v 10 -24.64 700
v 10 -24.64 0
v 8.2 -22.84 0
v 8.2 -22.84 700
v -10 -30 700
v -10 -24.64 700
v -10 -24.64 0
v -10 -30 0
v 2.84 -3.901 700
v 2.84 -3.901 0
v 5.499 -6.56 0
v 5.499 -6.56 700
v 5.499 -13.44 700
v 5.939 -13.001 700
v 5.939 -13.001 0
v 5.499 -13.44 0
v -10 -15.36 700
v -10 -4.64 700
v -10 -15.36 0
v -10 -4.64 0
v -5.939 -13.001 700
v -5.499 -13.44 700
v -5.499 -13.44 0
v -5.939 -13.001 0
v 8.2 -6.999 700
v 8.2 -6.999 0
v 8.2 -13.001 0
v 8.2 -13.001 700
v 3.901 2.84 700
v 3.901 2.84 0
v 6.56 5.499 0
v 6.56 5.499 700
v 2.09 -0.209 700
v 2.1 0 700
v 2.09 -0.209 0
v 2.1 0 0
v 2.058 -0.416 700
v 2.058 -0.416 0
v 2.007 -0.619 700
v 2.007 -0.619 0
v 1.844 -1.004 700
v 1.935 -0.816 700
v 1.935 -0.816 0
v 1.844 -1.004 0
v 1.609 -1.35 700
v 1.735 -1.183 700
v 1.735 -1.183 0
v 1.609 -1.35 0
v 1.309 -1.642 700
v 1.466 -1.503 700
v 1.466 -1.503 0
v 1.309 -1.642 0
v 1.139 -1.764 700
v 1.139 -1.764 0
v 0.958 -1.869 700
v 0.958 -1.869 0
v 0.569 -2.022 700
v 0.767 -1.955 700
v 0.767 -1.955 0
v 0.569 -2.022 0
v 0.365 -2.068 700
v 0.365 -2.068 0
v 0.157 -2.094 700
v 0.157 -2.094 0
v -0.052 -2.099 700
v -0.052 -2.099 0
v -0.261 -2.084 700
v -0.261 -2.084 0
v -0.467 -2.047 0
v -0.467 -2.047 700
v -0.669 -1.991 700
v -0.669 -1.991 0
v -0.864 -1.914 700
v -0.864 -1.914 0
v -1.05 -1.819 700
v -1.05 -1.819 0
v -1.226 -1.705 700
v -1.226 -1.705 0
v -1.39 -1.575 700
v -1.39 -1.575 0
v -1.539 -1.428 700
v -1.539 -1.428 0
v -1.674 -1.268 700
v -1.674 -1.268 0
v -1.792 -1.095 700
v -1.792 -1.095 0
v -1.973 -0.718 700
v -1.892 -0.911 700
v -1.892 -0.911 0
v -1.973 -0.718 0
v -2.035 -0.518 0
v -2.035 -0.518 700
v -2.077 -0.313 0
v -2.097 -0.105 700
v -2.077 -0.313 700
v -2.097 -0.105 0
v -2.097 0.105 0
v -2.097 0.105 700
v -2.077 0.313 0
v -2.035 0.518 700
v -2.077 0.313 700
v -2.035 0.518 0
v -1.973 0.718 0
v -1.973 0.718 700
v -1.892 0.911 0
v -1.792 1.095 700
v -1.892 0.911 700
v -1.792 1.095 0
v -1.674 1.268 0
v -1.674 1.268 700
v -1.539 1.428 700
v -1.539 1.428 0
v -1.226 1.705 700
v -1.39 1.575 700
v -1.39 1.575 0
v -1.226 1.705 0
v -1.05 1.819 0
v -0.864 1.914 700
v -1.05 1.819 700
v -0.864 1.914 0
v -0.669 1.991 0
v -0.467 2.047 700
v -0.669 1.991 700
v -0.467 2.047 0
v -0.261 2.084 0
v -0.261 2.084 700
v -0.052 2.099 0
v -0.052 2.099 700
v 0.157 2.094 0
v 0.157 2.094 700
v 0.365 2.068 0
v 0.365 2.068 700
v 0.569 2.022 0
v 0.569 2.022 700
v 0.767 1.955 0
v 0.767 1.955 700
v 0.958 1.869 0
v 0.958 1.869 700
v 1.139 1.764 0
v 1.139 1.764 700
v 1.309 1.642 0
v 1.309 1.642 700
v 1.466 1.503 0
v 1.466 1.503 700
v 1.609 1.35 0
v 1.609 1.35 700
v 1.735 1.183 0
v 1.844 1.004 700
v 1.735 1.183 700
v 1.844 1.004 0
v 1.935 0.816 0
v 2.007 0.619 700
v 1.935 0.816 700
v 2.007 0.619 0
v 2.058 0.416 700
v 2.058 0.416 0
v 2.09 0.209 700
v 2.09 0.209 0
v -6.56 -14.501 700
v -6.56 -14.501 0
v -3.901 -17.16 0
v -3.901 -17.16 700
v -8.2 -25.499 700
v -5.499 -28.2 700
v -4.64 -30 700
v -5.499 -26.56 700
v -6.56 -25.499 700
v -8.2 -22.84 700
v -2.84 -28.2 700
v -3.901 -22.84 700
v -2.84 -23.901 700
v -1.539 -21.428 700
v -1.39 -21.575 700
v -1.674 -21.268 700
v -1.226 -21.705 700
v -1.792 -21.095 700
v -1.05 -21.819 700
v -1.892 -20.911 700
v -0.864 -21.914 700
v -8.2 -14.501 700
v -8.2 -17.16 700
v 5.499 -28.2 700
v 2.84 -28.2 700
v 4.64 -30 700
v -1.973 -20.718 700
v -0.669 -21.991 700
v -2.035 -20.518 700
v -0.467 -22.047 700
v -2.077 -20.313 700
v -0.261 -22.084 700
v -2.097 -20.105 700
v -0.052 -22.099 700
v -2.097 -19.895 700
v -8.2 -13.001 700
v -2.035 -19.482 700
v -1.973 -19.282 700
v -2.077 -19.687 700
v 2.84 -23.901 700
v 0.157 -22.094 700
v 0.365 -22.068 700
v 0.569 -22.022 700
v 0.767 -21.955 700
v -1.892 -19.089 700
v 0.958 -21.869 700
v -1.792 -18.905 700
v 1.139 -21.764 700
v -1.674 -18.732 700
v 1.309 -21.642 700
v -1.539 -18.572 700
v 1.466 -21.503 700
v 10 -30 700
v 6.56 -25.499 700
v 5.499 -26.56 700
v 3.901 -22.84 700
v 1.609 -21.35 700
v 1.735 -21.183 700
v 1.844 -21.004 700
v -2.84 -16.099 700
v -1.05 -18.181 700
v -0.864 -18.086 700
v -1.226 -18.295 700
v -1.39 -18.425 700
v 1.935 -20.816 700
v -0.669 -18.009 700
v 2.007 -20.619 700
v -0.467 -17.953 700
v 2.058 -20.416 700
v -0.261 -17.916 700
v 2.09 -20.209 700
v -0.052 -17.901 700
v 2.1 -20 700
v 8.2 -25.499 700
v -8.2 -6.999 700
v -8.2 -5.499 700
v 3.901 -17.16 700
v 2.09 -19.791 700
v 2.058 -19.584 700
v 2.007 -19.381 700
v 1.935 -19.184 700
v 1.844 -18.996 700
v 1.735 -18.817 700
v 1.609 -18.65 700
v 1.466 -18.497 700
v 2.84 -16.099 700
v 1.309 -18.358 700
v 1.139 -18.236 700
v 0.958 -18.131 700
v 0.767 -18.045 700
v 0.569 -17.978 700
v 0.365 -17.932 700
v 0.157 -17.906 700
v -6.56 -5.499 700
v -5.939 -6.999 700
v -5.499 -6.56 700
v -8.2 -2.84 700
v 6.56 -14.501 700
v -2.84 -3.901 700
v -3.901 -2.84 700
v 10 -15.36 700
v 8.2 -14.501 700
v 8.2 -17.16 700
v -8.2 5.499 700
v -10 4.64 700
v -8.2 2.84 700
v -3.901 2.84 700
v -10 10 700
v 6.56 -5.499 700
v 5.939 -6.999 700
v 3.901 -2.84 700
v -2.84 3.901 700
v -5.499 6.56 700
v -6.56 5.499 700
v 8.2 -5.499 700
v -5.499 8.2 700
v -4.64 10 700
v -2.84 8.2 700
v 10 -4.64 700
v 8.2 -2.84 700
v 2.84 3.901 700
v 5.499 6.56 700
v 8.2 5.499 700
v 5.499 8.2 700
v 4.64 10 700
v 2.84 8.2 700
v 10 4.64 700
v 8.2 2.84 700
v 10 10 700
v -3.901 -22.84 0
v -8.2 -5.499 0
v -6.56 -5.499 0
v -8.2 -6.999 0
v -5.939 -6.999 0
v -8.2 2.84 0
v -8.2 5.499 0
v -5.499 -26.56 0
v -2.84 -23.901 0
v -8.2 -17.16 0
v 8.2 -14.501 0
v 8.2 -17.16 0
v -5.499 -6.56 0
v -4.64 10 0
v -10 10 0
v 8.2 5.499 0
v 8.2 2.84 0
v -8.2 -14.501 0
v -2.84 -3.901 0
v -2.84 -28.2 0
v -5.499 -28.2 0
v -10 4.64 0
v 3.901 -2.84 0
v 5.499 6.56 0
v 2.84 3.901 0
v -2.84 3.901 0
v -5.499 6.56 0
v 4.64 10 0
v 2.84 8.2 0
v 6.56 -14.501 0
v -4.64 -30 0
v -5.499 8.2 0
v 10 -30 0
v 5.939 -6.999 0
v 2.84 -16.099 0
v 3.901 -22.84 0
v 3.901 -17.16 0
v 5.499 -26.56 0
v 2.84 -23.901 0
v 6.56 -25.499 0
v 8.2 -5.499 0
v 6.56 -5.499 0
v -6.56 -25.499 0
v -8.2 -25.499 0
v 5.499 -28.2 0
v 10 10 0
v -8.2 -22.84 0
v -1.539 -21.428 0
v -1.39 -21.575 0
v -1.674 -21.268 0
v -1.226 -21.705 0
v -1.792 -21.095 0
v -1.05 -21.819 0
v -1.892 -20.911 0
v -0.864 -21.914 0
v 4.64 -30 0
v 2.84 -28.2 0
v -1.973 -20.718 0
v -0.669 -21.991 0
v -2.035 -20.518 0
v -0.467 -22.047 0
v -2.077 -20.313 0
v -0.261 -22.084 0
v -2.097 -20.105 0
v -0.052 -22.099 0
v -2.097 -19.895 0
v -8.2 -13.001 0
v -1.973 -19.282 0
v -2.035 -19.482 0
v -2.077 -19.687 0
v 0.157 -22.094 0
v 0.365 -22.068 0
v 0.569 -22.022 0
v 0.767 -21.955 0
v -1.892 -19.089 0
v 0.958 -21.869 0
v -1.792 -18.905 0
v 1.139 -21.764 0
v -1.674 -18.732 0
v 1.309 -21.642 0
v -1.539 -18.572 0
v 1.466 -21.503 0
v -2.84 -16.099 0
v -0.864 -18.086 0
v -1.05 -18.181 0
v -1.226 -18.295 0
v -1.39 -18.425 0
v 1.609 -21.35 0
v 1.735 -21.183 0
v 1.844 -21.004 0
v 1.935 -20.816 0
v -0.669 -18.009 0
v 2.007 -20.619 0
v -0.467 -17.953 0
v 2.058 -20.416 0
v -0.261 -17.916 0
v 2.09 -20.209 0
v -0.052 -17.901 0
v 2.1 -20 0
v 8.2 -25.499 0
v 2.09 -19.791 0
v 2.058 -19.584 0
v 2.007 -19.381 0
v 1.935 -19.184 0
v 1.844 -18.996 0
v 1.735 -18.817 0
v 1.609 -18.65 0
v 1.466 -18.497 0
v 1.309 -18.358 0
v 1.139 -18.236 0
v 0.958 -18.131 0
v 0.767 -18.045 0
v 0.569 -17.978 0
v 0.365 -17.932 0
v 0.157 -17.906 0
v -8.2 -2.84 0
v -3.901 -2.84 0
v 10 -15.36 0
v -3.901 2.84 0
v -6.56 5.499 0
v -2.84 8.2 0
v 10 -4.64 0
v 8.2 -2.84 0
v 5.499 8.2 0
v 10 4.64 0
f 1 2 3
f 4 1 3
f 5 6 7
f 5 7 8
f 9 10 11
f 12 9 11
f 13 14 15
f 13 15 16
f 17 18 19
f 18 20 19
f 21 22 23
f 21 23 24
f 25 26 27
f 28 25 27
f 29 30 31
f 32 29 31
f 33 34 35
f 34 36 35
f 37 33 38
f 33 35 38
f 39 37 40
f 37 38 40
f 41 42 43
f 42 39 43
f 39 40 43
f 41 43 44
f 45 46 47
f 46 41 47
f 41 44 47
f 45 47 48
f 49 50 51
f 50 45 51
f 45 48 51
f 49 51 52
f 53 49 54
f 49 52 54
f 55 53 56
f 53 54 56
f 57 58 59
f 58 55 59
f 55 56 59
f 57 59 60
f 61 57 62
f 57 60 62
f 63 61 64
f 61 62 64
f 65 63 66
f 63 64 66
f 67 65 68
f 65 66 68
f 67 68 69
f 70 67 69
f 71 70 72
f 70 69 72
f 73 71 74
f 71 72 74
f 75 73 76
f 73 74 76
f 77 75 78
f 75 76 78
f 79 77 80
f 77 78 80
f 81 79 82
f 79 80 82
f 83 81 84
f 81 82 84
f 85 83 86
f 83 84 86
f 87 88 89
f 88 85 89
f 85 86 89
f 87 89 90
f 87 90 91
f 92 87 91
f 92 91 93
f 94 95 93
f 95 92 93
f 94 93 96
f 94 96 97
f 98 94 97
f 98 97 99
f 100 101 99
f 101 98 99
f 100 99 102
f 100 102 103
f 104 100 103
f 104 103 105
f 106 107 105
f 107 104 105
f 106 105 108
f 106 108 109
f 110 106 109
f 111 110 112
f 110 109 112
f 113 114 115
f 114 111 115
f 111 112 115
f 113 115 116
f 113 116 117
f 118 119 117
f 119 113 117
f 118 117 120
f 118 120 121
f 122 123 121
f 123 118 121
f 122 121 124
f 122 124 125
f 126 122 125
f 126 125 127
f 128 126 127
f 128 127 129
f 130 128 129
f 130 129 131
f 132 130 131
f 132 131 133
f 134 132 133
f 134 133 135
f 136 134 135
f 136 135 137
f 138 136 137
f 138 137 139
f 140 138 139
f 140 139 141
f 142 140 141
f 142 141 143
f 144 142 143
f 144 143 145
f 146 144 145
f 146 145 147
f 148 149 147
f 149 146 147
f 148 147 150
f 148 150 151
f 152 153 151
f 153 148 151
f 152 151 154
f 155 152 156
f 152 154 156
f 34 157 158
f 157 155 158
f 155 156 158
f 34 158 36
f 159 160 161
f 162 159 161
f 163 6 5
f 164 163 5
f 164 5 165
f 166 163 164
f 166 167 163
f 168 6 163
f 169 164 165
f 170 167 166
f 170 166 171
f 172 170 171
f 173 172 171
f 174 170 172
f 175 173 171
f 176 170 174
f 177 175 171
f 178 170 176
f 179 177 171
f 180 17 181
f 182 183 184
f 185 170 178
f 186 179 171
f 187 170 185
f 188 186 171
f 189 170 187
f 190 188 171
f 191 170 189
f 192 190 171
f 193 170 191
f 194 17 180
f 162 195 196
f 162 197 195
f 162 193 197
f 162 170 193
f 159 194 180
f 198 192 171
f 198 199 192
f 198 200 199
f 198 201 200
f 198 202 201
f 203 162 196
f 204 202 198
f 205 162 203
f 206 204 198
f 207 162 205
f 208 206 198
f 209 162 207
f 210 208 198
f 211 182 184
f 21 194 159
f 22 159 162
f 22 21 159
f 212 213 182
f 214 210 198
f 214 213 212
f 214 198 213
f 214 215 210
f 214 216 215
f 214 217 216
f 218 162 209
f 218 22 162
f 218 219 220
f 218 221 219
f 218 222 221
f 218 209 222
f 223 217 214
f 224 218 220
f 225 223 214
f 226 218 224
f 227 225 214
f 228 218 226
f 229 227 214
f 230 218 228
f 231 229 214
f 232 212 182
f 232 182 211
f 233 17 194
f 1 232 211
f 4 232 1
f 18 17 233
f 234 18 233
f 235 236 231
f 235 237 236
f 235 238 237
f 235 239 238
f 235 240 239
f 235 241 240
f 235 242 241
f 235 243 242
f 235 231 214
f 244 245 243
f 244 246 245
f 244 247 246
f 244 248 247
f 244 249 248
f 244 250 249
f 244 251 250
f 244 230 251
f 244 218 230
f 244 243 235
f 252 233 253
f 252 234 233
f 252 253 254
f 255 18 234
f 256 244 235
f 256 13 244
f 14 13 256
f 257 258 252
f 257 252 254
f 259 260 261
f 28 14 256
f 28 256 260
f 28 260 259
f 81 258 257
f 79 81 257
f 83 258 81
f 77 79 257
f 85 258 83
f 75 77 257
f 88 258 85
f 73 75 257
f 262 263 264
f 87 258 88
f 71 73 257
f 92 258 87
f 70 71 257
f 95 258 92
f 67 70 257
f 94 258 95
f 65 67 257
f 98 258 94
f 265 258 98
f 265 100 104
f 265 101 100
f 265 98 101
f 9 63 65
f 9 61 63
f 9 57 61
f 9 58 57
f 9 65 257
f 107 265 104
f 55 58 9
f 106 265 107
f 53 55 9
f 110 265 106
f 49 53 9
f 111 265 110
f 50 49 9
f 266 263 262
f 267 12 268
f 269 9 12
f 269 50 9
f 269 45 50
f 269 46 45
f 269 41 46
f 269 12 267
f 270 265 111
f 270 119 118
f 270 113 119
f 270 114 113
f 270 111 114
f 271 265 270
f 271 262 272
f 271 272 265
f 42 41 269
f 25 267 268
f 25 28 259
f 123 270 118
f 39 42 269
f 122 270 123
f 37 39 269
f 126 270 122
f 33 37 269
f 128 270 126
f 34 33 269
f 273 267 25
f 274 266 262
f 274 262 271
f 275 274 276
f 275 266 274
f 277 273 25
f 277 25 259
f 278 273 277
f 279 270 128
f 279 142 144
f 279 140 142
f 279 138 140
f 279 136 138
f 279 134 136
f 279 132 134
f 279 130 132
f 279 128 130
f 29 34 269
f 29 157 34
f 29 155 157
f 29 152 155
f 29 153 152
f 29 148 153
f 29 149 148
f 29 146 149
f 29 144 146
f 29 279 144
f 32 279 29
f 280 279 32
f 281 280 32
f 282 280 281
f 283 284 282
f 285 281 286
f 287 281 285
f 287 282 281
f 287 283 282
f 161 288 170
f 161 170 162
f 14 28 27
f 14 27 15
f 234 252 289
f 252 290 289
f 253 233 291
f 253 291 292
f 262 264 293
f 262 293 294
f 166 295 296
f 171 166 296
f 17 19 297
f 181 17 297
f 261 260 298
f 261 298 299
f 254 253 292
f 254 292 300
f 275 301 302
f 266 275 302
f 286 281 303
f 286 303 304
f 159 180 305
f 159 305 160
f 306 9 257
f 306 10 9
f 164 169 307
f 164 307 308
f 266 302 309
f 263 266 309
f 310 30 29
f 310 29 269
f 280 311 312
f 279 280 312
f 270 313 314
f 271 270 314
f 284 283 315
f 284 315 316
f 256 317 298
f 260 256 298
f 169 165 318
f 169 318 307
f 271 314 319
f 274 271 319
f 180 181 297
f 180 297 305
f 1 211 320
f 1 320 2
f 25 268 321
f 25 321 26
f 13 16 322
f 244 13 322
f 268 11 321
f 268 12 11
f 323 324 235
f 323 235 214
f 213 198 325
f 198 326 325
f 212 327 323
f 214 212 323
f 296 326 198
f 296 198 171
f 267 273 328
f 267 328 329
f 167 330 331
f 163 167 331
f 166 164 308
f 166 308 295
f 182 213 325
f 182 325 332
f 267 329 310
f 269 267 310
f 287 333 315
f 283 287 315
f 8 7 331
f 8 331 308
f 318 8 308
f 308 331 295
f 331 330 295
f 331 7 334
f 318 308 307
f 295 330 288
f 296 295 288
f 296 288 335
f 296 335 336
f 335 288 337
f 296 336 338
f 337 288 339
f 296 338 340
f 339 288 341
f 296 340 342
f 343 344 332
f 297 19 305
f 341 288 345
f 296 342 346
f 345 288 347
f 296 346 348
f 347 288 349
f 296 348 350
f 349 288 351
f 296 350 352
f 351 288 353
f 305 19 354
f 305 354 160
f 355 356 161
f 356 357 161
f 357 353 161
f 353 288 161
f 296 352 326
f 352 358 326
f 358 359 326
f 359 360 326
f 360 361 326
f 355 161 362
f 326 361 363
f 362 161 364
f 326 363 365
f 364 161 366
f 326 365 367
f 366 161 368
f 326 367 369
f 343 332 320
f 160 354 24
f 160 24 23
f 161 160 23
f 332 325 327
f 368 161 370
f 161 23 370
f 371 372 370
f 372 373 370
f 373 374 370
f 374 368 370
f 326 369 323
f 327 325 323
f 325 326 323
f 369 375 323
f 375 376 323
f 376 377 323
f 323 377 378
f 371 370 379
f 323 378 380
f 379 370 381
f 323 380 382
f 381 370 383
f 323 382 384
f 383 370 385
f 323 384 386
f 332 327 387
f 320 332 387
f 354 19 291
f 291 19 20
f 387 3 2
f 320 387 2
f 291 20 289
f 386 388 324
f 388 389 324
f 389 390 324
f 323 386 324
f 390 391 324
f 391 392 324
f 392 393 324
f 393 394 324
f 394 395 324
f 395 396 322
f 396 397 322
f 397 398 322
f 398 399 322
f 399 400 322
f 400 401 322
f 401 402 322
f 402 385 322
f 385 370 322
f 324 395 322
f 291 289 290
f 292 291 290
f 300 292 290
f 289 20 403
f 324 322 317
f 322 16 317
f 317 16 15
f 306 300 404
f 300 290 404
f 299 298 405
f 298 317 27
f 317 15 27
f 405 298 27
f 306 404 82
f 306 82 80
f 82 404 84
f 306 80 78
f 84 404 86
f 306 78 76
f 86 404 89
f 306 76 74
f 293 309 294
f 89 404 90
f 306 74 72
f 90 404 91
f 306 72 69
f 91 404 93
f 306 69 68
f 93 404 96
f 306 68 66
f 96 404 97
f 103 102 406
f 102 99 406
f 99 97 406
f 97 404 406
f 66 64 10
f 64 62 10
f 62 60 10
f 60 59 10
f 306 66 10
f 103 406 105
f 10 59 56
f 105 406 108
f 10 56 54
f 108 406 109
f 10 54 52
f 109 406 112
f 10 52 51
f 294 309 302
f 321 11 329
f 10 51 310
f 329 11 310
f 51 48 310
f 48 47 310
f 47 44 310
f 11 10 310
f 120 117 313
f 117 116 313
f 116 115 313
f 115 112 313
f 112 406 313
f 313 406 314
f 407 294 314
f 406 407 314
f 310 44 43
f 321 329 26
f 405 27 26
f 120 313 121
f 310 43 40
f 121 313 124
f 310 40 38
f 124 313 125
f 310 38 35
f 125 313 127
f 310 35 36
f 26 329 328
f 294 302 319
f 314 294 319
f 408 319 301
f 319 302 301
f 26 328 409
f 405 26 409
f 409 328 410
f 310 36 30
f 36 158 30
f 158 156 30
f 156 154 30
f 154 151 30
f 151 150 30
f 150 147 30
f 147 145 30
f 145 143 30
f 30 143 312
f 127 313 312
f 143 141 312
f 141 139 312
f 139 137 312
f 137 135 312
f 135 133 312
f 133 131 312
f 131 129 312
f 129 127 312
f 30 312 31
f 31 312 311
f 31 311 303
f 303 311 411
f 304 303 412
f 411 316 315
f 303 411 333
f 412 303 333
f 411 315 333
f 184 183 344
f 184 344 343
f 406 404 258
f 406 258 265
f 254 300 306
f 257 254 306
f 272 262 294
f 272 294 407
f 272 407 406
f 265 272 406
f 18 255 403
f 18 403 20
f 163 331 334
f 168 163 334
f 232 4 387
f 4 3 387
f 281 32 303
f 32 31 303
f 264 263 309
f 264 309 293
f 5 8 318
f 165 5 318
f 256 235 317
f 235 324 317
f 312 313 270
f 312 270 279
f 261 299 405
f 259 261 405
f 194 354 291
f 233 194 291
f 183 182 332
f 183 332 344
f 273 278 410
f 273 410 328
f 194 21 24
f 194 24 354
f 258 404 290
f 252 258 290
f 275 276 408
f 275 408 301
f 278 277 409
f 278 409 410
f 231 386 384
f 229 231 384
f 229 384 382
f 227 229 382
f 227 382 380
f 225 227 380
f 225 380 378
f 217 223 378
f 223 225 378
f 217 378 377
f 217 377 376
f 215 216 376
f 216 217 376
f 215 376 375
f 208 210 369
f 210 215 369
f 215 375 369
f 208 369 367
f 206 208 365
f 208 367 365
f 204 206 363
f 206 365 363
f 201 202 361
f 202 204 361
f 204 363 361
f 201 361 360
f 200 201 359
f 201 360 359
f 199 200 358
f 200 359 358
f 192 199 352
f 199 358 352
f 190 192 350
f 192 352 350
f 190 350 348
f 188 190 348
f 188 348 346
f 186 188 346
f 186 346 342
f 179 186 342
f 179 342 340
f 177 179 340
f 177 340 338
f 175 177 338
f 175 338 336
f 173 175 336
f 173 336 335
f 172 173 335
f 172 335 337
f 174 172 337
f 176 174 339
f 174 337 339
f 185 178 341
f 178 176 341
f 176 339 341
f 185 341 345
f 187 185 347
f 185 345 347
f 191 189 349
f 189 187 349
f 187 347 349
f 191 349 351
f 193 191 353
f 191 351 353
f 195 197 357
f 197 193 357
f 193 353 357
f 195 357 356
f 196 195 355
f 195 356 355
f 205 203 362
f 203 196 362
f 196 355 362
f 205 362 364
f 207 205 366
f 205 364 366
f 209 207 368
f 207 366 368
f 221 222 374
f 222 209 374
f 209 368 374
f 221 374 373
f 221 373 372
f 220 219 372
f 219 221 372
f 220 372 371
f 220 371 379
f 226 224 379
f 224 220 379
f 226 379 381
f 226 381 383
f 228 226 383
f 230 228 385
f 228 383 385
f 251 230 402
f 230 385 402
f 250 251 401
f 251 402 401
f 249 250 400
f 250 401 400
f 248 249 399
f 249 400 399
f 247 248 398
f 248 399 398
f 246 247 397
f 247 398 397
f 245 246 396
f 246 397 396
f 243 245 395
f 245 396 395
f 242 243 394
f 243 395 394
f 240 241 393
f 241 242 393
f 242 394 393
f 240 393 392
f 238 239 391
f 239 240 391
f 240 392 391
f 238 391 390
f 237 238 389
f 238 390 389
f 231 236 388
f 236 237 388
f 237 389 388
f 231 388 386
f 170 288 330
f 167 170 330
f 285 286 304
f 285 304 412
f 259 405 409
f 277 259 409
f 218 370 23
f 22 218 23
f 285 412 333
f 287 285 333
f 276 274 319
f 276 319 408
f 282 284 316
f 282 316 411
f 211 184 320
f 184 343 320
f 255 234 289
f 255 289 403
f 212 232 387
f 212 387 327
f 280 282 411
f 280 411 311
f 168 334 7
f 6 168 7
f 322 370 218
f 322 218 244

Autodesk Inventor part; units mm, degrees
ref_plane "YZ Plane" through (0, 0, 0) normal (1, 0, 0) x (0, 1, 0)
sketch "Sketch1" plane through (0, 0, 0) normal (0, 0, 1) x (1, 0, 0)
  line L0 (-3.9007, 3.9007) -> (3.9007, 3.9007)
  line L1 (3.9007, 3.9007) -> (3.9007, -3.9007)
  line L2 (3.9007, -3.9007) -> (-3.9007, -3.9007)
  line L3 (-3.9007, -3.9007) -> (-3.9007, 3.9007)
  line L4 (0, 3.9007) -> (0, -3.9007) construction
  line L5 (-3.9007, 0) -> (3.9007, 0) construction
  circle A0 centre (0, 0) radius 2.1
  line L6 (0, 0) -> (-16.1173, 16.1173) construction
  line L7 (0, 0) -> (22.7933, 0) construction
  line L8 (-2.84, 3.9007) -> (-5.4993, 6.56)
  line L9 (-5.4993, 6.56) -> (-5.4993, 8.2)
  line L10 (-5.4993, 8.2) -> (-2.84, 8.2)
  line L11 (-2.84, 8.2) -> (-4.64, 10)
  line L12 (-4.64, 10) -> (-10, 10)
  line L13 (-10, 10) -> (-10, 4.64)
  line L14 (-10, 4.64) -> (-8.2, 2.84)
  line L15 (-8.2, 2.84) -> (-8.2, 5.4993)
  line L16 (-8.2, 5.4993) -> (-6.56, 5.4993)
  line L17 (-6.56, 5.4993) -> (-3.9007, 2.84)
  line L18 (-3.9007, 2.84) -> (-11.3102, 2.84) construction
  line L19 (-2.84, 3.9007) -> (-3.9007, 3.9007)
  line L20 (-3.9007, 2.84) -> (-3.9007, 3.9007)
  line L21 (-3.9007, -2.84) -> (-6.56, -5.4993)
  line L22 (-6.56, -5.4993) -> (-8.2, -5.4993)
  line L23 (-8.2, -5.4993) -> (-8.2, -2.84)
  line L24 (-8.2, -2.84) -> (-10, -4.64)
  line L25 (-10, -4.64) -> (-10, -10)
  line L26 (-10, -10) -> (-4.64, -10)
  line L27 (-4.64, -10) -> (-2.84, -8.2)
  line L28 (-2.84, -8.2) -> (-5.4993, -8.2)
  line L29 (-5.4993, -8.2) -> (-5.4993, -6.56)
  line L30 (-5.4993, -6.56) -> (-2.84, -3.9007)
  line L31 (-3.9007, -2.84) -> (-3.9007, -3.9007)
  line L32 (-2.84, -3.9007) -> (-3.9007, -3.9007)
  line L33 (2.84, -3.9007) -> (5.4993, -6.56)
  line L34 (5.4993, -6.56) -> (5.4993, -8.2)
  line L35 (5.4993, -8.2) -> (2.84, -8.2)
  line L36 (2.84, -8.2) -> (4.64, -10)
  line L37 (4.64, -10) -> (10, -10)
  line L38 (10, -10) -> (10, -4.64)
  line L39 (10, -4.64) -> (8.2, -2.84)
  line L40 (8.2, -2.84) -> (8.2, -5.4993)
  line L41 (8.2, -5.4993) -> (6.56, -5.4993)
  line L42 (6.56, -5.4993) -> (3.9007, -2.84)
  line L43 (2.84, -3.9007) -> (3.9007, -3.9007)
  line L44 (3.9007, -2.84) -> (3.9007, -3.9007)
  line L45 (3.9007, 2.84) -> (6.56, 5.4993)
  line L46 (6.56, 5.4993) -> (8.2, 5.4993)
  line L47 (8.2, 5.4993) -> (8.2, 2.84)
  line L48 (8.2, 2.84) -> (10, 4.64)
  line L49 (10, 4.64) -> (10, 10)
  line L50 (10, 10) -> (4.64, 10)
  line L51 (4.64, 10) -> (2.84, 8.2)
  line L52 (2.84, 8.2) -> (5.4993, 8.2)
  line L53 (5.4993, 8.2) -> (5.4993, 6.56)
  line L54 (5.4993, 6.56) -> (2.84, 3.9007)
  line L55 (3.9007, 2.84) -> (3.9007, 3.9007)
  line L56 (2.84, 3.9007) -> (3.9007, 3.9007)
  dimension "d7" = 4.2
  dimension "d8" = 135
  dimension "d9" = 1.5
  dimension "d10" = 1.64
  dimension "d11" = 1.8
  dimension "d12" = 2.84
  dimension "d13" = 10
  dimension "d16" = 360
extrude "Extrusion1" add sketch "Sketch1" along normal blind 700
pattern_linear "Rectangular Pattern1" count 2 spacing 20 along (0, -1, 0) of "Extrusion1"
sketch "Sketch2" plane through (0, 0, 700) normal (0, 0, 1) x (1, 0, 0)
  line L0 (8.2, -2.84) -> (8.2, -5.4993) projected
  line L1 (8.2, -5.4993) -> (6.56, -5.4993) projected
  line L2 (-6.56, -5.4993) -> (-8.2, -5.4993) projected
  line L3 (-8.2, -5.4993) -> (-8.2, -2.84) projected
  line L4 (-8.2, -14.5007) -> (-6.56, -14.5007) projected
  line L5 (6.56, -14.5007) -> (8.2, -14.5007) projected
  line L6 (5.4993, -11.8) -> (5.4993, -13.44) projected
  line L7 (5.4993, -13.44) -> (2.84, -16.0993) projected
  line L8 (-2.84, -16.0993) -> (-5.4993, -13.44) projected
  line L9 (-5.4993, -8.2) -> (-5.4993, -6.56) projected
  line L10 (-5.4993, -6.56) -> (-2.84, -3.9007) projected
  line L11 (2.84, -3.9007) -> (5.4993, -6.56) projected
  line L12 (2.84, -8.2) -> (4.64, -10) projected
  line L13 (-8.2, -6.9993) -> (-5.9387, -6.9993)
  line L14 (-5.9387, -6.9993) -> (-4.1231, -5.1837)
  line L15 (-4.1231, -5.1837) -> (4.1231, -5.1837)
  line L16 (4.1231, -5.1837) -> (5.9387, -6.9993)
  line L17 (5.9387, -6.9993) -> (8.2, -6.9993)
  line L18 (8.2, -6.9993) -> (8.2, -13.0007)
  line L19 (8.2, -13.0007) -> (5.9387, -13.0007)
  line L20 (5.9387, -13.0007) -> (4.2461, -14.6932)
  line L21 (4.2461, -14.6932) -> (-4.2461, -14.6932)
  line L22 (-4.2461, -14.6932) -> (-5.9387, -13.0007)
  line L23 (-5.9387, -13.0007) -> (-8.2, -13.0007)
  line L24 (-8.2, -13.0007) -> (-8.2, -6.9993)
  dimension "d23" = 1.5
  dimension "d24" = 1.5
  dimension "d25" = 1.5
  dimension "d26" = 1.5
extrude "Extrusion2" cut sketch "Sketch2" against normal up to next
ref_plane "Work Plane3" through (0, -20, 0) normal (0, 1, 0) x (-1, 0, 0)
ref_plane "Work Plane2" through (0, 0, 0) normal (0, 1, 0) x (-1, 0, 0)
ref_plane "Work Plane4" through (0, 0, 0) normal (0, 1, 0) x (-1, 0, 0)
ref_plane "Work Plane5" through (0, -10, 0) normal (0, 1, 0) x (-1, 0, 0)
ref_plane "Work Plane1" through (0, -10, 0) normal (0, 1, 0) x (-1, 0, 0)
equation "\"d24\" = d23"
equation "\"d25\" = d23"
equation "\"d26\" = d23"
properties part number "20x40x597mm" material "Aluminum 6061"
